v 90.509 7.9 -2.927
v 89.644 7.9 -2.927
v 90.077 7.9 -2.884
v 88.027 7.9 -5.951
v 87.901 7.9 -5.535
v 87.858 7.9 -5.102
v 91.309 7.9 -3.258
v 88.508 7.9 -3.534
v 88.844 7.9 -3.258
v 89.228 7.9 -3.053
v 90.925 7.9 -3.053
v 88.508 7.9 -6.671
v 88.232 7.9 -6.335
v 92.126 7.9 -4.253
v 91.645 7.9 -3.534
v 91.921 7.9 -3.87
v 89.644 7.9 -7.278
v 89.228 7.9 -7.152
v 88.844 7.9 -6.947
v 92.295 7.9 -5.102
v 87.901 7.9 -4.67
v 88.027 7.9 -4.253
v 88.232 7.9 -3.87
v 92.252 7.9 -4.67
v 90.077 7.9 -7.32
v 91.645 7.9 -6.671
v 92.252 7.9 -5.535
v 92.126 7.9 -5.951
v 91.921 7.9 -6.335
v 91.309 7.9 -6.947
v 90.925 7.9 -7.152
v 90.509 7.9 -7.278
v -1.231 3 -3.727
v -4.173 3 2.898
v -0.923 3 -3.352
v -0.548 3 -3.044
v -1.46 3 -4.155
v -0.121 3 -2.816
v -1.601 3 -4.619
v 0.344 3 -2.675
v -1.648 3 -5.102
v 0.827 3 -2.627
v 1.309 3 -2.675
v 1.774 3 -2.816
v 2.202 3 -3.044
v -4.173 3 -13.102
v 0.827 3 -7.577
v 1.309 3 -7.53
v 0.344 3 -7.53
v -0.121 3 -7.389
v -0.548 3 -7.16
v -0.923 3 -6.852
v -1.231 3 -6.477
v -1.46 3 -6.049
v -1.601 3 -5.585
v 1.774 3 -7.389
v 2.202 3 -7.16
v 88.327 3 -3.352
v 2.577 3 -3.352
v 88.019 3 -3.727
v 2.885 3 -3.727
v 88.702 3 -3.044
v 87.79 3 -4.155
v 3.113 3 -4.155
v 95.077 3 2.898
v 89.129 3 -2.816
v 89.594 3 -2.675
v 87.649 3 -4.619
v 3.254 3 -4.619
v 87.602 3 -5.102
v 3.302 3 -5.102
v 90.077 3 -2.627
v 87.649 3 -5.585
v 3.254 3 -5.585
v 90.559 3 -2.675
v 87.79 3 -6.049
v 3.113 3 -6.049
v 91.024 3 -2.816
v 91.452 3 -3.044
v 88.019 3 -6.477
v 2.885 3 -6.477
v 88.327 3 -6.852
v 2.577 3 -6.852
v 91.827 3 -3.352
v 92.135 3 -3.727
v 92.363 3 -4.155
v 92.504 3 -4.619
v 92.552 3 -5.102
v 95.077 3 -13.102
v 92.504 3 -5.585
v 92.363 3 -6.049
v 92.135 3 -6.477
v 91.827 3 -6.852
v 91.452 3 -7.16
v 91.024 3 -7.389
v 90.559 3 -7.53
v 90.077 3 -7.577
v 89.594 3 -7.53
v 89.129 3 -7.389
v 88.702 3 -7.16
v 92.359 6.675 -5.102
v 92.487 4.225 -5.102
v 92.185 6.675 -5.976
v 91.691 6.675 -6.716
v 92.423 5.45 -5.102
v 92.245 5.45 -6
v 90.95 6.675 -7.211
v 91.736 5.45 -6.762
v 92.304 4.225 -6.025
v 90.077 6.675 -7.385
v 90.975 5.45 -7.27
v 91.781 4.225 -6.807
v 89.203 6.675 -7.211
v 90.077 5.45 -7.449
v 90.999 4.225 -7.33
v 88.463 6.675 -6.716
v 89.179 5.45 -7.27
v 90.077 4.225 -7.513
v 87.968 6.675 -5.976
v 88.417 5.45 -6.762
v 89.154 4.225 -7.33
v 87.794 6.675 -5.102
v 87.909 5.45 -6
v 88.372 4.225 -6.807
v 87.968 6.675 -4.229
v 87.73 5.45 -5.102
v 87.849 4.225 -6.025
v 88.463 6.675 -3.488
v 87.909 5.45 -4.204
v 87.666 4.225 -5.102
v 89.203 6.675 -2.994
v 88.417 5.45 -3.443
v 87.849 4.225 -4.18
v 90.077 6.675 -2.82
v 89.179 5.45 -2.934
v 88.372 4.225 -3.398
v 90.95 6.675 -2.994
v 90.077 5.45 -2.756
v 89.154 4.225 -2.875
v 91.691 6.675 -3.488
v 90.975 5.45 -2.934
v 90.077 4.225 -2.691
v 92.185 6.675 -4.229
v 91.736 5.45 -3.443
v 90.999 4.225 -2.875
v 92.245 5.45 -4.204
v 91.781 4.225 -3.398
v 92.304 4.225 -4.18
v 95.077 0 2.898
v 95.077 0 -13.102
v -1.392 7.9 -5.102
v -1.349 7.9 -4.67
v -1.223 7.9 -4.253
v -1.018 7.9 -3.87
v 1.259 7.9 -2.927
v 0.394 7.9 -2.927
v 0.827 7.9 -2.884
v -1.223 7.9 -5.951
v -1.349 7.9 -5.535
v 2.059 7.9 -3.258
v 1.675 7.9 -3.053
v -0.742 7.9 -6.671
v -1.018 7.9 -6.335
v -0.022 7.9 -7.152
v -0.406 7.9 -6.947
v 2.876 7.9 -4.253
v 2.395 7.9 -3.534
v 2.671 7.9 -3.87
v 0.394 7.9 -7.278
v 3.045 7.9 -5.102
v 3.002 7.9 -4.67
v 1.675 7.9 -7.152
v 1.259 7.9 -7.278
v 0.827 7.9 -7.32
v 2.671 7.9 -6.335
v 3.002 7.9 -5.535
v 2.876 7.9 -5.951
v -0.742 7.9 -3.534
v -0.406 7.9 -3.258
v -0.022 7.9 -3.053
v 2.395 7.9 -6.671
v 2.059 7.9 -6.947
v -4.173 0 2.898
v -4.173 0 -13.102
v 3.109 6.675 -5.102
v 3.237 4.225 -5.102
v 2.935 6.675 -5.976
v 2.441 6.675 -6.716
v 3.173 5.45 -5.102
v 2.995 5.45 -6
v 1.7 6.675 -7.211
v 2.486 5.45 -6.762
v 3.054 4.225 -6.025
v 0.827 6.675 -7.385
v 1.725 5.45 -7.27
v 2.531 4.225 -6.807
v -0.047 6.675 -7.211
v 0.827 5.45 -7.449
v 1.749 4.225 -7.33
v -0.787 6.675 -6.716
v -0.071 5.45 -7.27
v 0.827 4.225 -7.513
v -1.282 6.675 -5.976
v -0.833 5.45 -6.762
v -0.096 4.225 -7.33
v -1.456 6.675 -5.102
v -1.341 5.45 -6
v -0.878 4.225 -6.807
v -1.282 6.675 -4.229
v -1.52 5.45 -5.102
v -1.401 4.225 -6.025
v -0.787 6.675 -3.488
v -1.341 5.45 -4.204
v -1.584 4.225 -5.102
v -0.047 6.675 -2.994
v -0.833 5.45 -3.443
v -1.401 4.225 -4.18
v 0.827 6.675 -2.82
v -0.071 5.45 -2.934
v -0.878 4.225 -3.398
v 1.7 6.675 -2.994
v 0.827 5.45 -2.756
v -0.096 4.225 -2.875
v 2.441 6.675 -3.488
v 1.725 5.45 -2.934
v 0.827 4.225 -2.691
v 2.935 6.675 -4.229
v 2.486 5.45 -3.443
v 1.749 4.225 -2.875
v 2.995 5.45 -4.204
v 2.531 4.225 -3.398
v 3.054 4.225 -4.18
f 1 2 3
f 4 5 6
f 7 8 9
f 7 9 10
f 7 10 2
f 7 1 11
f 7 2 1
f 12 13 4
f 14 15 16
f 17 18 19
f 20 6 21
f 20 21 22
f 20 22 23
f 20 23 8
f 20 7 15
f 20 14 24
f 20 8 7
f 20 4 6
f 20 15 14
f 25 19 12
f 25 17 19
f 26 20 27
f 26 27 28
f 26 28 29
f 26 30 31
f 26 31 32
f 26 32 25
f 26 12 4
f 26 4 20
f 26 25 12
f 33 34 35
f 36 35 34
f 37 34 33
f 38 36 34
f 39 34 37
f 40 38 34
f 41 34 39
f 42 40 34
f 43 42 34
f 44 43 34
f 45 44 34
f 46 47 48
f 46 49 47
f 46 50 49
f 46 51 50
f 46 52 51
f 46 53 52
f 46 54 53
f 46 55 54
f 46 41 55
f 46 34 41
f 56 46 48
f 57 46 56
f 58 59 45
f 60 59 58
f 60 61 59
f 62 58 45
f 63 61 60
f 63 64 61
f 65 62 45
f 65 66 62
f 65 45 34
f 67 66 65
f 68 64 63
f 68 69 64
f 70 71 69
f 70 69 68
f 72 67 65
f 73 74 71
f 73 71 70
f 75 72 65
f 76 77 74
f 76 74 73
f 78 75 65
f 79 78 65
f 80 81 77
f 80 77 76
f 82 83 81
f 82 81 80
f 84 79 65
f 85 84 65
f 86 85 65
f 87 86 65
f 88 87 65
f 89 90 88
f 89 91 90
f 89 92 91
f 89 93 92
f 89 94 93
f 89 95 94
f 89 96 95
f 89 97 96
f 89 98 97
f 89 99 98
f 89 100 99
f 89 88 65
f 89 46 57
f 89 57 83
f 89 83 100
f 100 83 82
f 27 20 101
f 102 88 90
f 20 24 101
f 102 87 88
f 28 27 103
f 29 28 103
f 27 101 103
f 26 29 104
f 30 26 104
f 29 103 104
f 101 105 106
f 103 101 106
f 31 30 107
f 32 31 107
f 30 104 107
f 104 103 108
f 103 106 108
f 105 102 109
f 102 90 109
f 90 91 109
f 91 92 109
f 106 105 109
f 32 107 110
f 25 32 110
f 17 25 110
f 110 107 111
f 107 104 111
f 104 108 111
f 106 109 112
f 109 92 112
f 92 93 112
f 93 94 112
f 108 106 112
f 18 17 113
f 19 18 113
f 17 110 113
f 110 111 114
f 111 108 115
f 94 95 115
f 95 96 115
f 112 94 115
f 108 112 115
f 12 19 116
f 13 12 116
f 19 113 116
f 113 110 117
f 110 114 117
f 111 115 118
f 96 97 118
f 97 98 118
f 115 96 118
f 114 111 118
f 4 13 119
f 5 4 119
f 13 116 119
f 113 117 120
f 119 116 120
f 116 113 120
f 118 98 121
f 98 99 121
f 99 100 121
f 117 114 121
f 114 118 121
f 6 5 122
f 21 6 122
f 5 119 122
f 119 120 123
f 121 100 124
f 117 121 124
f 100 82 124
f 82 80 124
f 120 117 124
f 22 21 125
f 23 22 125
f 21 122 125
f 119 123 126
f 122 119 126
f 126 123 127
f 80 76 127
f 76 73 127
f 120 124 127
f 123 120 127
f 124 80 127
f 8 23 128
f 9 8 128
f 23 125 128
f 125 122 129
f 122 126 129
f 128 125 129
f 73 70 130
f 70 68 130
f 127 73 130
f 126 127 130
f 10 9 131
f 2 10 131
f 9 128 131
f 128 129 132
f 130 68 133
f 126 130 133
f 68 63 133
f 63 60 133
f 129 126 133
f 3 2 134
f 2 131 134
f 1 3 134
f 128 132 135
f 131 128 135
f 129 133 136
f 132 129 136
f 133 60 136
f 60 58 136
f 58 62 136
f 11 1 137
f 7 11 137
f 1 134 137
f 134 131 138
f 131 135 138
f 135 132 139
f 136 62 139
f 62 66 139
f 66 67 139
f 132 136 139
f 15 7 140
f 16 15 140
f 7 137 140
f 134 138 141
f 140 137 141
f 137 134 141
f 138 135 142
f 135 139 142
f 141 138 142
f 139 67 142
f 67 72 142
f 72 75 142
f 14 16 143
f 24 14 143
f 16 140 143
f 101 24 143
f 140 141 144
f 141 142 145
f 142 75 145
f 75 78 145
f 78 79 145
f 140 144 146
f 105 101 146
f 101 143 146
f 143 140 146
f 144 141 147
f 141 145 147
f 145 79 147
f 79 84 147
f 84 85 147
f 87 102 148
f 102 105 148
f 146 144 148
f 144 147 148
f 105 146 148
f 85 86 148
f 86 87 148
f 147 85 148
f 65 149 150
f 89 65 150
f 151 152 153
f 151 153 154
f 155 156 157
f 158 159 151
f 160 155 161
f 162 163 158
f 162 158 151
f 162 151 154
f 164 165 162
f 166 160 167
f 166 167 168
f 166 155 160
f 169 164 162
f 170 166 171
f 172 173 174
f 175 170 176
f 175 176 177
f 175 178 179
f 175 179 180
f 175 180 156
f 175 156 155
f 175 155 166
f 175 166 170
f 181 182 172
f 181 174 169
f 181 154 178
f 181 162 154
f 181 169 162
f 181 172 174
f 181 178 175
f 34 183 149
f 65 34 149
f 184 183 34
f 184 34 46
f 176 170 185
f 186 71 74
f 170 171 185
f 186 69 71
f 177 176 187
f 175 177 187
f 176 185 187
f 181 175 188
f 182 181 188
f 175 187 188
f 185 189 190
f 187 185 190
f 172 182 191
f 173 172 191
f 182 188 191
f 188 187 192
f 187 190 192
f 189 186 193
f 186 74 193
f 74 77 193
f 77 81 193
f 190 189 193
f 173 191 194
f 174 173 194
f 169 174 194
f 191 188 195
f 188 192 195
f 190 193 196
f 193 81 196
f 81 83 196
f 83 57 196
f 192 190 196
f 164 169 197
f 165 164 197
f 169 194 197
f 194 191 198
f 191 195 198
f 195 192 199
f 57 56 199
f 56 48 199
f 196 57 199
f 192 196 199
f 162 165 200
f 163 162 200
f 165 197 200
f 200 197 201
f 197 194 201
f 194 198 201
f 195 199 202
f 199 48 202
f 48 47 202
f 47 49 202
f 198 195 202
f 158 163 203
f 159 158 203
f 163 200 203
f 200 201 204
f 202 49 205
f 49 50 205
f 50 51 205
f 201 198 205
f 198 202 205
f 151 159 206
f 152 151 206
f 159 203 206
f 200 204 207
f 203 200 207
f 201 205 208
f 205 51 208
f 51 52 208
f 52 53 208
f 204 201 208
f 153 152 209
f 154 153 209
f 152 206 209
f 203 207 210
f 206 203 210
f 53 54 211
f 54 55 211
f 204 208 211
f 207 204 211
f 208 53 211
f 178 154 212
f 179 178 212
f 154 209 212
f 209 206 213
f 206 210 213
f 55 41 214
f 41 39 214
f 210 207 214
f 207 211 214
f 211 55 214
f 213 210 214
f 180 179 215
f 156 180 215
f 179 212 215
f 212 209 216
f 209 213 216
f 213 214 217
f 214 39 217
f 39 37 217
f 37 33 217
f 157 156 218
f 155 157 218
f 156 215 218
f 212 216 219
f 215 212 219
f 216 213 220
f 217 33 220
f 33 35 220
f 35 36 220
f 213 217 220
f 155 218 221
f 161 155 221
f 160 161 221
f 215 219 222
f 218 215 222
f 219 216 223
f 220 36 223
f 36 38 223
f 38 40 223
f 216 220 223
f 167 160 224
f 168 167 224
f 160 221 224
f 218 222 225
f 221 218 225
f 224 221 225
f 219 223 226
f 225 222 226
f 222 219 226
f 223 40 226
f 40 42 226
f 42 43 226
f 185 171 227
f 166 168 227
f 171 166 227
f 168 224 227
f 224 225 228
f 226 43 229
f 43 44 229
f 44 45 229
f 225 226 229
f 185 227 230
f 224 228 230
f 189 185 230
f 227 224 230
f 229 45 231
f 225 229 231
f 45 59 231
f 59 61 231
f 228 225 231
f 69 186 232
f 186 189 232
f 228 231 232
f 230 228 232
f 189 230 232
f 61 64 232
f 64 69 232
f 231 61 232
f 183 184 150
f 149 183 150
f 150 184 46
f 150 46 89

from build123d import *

# Parameters (mm, degrees)
SKETCH1_W                     = 99.25
SKETCH1_H                     = 16
BOSS_EXTRUDE1_DEPTH           = 3
SKETCH2_R                     = 2.475
BOSS_EXTRUDE2_DEPTH           = 4.9
BOSS_EXTRUDE2_DRAFT           = 3
BOSS_EXTRUDE2_PROFILE_2_DEPTH = 4.9
BOSS_EXTRUDE2_PROFILE_2_DRAFT = 3


with BuildPart() as part:
    # Sketch1 → Boss-Extrude1 (new body)
    with BuildSketch(Plane(origin=(0, 0, 0), x_dir=(1, 0, 0), z_dir=(0, 1, 0))):
        with Locations((45.45161309, 5.10225193)):
            Rectangle(SKETCH1_W, SKETCH1_H)
    extrude(amount=BOSS_EXTRUDE1_DEPTH)


with BuildPart() as boss_extrude2_tool:
    # Sketch2 → Boss-Extrude2 (with draft: the straight prism first)
    with BuildSketch(Plane(origin=(0, 3, 0), x_dir=(1, 0, 0), z_dir=(0, 1, 0))):
        with Locations((0.82661309, 5.10225193)):
            Circle(SKETCH2_R)
    extrude(amount=BOSS_EXTRUDE2_DEPTH)
    # Boss-Extrude2: the draft: its side faces are tilted about the plane it starts from
    boss_extrude2_sides = [boss_extrude2_tool.faces().sort_by_distance(p)[0] for p in [
        (-1.64838691, 5.45, -5.10225193),
    ]]
    draft(boss_extrude2_sides, Plane(origin=(0, 3, 0), x_dir=(1, 0, 0), z_dir=(0, 1, 0)), BOSS_EXTRUDE2_DRAFT)


with BuildPart() as part_1:
    add(part.part)

    # Boss-Extrude2: add boss_extrude2_tool
    add(boss_extrude2_tool.part)


with BuildPart() as boss_extrude2_profile_2_tool:
    # Sketch2 → Boss-Extrude2 profile 2 (with draft: the straight prism first)
    with BuildSketch(Plane(origin=(0, 3, 0), x_dir=(1, 0, 0), z_dir=(0, 1, 0))):
        with Locations((90.07661309, 5.10225193)):
            Circle(SKETCH2_R)
    extrude(amount=BOSS_EXTRUDE2_PROFILE_2_DEPTH)
    # Boss-Extrude2 profile 2: the draft: its side faces are tilted about the plane it starts from
    boss_extrude2_profile_2_sides = [boss_extrude2_profile_2_tool.faces().sort_by_distance(p)[0] for p in [
        (87.60161309, 5.45, -5.10225193),
    ]]
    draft(boss_extrude2_profile_2_sides, Plane(origin=(0, 3, 0), x_dir=(1, 0, 0), z_dir=(0, 1, 0)), BOSS_EXTRUDE2_PROFILE_2_DRAFT)


with BuildPart() as part_2:
    add(part_1.part)

    # Boss-Extrude2 profile 2: add boss_extrude2_profile_2_tool
    add(boss_extrude2_profile_2_tool.part)


solid = part_2.part
